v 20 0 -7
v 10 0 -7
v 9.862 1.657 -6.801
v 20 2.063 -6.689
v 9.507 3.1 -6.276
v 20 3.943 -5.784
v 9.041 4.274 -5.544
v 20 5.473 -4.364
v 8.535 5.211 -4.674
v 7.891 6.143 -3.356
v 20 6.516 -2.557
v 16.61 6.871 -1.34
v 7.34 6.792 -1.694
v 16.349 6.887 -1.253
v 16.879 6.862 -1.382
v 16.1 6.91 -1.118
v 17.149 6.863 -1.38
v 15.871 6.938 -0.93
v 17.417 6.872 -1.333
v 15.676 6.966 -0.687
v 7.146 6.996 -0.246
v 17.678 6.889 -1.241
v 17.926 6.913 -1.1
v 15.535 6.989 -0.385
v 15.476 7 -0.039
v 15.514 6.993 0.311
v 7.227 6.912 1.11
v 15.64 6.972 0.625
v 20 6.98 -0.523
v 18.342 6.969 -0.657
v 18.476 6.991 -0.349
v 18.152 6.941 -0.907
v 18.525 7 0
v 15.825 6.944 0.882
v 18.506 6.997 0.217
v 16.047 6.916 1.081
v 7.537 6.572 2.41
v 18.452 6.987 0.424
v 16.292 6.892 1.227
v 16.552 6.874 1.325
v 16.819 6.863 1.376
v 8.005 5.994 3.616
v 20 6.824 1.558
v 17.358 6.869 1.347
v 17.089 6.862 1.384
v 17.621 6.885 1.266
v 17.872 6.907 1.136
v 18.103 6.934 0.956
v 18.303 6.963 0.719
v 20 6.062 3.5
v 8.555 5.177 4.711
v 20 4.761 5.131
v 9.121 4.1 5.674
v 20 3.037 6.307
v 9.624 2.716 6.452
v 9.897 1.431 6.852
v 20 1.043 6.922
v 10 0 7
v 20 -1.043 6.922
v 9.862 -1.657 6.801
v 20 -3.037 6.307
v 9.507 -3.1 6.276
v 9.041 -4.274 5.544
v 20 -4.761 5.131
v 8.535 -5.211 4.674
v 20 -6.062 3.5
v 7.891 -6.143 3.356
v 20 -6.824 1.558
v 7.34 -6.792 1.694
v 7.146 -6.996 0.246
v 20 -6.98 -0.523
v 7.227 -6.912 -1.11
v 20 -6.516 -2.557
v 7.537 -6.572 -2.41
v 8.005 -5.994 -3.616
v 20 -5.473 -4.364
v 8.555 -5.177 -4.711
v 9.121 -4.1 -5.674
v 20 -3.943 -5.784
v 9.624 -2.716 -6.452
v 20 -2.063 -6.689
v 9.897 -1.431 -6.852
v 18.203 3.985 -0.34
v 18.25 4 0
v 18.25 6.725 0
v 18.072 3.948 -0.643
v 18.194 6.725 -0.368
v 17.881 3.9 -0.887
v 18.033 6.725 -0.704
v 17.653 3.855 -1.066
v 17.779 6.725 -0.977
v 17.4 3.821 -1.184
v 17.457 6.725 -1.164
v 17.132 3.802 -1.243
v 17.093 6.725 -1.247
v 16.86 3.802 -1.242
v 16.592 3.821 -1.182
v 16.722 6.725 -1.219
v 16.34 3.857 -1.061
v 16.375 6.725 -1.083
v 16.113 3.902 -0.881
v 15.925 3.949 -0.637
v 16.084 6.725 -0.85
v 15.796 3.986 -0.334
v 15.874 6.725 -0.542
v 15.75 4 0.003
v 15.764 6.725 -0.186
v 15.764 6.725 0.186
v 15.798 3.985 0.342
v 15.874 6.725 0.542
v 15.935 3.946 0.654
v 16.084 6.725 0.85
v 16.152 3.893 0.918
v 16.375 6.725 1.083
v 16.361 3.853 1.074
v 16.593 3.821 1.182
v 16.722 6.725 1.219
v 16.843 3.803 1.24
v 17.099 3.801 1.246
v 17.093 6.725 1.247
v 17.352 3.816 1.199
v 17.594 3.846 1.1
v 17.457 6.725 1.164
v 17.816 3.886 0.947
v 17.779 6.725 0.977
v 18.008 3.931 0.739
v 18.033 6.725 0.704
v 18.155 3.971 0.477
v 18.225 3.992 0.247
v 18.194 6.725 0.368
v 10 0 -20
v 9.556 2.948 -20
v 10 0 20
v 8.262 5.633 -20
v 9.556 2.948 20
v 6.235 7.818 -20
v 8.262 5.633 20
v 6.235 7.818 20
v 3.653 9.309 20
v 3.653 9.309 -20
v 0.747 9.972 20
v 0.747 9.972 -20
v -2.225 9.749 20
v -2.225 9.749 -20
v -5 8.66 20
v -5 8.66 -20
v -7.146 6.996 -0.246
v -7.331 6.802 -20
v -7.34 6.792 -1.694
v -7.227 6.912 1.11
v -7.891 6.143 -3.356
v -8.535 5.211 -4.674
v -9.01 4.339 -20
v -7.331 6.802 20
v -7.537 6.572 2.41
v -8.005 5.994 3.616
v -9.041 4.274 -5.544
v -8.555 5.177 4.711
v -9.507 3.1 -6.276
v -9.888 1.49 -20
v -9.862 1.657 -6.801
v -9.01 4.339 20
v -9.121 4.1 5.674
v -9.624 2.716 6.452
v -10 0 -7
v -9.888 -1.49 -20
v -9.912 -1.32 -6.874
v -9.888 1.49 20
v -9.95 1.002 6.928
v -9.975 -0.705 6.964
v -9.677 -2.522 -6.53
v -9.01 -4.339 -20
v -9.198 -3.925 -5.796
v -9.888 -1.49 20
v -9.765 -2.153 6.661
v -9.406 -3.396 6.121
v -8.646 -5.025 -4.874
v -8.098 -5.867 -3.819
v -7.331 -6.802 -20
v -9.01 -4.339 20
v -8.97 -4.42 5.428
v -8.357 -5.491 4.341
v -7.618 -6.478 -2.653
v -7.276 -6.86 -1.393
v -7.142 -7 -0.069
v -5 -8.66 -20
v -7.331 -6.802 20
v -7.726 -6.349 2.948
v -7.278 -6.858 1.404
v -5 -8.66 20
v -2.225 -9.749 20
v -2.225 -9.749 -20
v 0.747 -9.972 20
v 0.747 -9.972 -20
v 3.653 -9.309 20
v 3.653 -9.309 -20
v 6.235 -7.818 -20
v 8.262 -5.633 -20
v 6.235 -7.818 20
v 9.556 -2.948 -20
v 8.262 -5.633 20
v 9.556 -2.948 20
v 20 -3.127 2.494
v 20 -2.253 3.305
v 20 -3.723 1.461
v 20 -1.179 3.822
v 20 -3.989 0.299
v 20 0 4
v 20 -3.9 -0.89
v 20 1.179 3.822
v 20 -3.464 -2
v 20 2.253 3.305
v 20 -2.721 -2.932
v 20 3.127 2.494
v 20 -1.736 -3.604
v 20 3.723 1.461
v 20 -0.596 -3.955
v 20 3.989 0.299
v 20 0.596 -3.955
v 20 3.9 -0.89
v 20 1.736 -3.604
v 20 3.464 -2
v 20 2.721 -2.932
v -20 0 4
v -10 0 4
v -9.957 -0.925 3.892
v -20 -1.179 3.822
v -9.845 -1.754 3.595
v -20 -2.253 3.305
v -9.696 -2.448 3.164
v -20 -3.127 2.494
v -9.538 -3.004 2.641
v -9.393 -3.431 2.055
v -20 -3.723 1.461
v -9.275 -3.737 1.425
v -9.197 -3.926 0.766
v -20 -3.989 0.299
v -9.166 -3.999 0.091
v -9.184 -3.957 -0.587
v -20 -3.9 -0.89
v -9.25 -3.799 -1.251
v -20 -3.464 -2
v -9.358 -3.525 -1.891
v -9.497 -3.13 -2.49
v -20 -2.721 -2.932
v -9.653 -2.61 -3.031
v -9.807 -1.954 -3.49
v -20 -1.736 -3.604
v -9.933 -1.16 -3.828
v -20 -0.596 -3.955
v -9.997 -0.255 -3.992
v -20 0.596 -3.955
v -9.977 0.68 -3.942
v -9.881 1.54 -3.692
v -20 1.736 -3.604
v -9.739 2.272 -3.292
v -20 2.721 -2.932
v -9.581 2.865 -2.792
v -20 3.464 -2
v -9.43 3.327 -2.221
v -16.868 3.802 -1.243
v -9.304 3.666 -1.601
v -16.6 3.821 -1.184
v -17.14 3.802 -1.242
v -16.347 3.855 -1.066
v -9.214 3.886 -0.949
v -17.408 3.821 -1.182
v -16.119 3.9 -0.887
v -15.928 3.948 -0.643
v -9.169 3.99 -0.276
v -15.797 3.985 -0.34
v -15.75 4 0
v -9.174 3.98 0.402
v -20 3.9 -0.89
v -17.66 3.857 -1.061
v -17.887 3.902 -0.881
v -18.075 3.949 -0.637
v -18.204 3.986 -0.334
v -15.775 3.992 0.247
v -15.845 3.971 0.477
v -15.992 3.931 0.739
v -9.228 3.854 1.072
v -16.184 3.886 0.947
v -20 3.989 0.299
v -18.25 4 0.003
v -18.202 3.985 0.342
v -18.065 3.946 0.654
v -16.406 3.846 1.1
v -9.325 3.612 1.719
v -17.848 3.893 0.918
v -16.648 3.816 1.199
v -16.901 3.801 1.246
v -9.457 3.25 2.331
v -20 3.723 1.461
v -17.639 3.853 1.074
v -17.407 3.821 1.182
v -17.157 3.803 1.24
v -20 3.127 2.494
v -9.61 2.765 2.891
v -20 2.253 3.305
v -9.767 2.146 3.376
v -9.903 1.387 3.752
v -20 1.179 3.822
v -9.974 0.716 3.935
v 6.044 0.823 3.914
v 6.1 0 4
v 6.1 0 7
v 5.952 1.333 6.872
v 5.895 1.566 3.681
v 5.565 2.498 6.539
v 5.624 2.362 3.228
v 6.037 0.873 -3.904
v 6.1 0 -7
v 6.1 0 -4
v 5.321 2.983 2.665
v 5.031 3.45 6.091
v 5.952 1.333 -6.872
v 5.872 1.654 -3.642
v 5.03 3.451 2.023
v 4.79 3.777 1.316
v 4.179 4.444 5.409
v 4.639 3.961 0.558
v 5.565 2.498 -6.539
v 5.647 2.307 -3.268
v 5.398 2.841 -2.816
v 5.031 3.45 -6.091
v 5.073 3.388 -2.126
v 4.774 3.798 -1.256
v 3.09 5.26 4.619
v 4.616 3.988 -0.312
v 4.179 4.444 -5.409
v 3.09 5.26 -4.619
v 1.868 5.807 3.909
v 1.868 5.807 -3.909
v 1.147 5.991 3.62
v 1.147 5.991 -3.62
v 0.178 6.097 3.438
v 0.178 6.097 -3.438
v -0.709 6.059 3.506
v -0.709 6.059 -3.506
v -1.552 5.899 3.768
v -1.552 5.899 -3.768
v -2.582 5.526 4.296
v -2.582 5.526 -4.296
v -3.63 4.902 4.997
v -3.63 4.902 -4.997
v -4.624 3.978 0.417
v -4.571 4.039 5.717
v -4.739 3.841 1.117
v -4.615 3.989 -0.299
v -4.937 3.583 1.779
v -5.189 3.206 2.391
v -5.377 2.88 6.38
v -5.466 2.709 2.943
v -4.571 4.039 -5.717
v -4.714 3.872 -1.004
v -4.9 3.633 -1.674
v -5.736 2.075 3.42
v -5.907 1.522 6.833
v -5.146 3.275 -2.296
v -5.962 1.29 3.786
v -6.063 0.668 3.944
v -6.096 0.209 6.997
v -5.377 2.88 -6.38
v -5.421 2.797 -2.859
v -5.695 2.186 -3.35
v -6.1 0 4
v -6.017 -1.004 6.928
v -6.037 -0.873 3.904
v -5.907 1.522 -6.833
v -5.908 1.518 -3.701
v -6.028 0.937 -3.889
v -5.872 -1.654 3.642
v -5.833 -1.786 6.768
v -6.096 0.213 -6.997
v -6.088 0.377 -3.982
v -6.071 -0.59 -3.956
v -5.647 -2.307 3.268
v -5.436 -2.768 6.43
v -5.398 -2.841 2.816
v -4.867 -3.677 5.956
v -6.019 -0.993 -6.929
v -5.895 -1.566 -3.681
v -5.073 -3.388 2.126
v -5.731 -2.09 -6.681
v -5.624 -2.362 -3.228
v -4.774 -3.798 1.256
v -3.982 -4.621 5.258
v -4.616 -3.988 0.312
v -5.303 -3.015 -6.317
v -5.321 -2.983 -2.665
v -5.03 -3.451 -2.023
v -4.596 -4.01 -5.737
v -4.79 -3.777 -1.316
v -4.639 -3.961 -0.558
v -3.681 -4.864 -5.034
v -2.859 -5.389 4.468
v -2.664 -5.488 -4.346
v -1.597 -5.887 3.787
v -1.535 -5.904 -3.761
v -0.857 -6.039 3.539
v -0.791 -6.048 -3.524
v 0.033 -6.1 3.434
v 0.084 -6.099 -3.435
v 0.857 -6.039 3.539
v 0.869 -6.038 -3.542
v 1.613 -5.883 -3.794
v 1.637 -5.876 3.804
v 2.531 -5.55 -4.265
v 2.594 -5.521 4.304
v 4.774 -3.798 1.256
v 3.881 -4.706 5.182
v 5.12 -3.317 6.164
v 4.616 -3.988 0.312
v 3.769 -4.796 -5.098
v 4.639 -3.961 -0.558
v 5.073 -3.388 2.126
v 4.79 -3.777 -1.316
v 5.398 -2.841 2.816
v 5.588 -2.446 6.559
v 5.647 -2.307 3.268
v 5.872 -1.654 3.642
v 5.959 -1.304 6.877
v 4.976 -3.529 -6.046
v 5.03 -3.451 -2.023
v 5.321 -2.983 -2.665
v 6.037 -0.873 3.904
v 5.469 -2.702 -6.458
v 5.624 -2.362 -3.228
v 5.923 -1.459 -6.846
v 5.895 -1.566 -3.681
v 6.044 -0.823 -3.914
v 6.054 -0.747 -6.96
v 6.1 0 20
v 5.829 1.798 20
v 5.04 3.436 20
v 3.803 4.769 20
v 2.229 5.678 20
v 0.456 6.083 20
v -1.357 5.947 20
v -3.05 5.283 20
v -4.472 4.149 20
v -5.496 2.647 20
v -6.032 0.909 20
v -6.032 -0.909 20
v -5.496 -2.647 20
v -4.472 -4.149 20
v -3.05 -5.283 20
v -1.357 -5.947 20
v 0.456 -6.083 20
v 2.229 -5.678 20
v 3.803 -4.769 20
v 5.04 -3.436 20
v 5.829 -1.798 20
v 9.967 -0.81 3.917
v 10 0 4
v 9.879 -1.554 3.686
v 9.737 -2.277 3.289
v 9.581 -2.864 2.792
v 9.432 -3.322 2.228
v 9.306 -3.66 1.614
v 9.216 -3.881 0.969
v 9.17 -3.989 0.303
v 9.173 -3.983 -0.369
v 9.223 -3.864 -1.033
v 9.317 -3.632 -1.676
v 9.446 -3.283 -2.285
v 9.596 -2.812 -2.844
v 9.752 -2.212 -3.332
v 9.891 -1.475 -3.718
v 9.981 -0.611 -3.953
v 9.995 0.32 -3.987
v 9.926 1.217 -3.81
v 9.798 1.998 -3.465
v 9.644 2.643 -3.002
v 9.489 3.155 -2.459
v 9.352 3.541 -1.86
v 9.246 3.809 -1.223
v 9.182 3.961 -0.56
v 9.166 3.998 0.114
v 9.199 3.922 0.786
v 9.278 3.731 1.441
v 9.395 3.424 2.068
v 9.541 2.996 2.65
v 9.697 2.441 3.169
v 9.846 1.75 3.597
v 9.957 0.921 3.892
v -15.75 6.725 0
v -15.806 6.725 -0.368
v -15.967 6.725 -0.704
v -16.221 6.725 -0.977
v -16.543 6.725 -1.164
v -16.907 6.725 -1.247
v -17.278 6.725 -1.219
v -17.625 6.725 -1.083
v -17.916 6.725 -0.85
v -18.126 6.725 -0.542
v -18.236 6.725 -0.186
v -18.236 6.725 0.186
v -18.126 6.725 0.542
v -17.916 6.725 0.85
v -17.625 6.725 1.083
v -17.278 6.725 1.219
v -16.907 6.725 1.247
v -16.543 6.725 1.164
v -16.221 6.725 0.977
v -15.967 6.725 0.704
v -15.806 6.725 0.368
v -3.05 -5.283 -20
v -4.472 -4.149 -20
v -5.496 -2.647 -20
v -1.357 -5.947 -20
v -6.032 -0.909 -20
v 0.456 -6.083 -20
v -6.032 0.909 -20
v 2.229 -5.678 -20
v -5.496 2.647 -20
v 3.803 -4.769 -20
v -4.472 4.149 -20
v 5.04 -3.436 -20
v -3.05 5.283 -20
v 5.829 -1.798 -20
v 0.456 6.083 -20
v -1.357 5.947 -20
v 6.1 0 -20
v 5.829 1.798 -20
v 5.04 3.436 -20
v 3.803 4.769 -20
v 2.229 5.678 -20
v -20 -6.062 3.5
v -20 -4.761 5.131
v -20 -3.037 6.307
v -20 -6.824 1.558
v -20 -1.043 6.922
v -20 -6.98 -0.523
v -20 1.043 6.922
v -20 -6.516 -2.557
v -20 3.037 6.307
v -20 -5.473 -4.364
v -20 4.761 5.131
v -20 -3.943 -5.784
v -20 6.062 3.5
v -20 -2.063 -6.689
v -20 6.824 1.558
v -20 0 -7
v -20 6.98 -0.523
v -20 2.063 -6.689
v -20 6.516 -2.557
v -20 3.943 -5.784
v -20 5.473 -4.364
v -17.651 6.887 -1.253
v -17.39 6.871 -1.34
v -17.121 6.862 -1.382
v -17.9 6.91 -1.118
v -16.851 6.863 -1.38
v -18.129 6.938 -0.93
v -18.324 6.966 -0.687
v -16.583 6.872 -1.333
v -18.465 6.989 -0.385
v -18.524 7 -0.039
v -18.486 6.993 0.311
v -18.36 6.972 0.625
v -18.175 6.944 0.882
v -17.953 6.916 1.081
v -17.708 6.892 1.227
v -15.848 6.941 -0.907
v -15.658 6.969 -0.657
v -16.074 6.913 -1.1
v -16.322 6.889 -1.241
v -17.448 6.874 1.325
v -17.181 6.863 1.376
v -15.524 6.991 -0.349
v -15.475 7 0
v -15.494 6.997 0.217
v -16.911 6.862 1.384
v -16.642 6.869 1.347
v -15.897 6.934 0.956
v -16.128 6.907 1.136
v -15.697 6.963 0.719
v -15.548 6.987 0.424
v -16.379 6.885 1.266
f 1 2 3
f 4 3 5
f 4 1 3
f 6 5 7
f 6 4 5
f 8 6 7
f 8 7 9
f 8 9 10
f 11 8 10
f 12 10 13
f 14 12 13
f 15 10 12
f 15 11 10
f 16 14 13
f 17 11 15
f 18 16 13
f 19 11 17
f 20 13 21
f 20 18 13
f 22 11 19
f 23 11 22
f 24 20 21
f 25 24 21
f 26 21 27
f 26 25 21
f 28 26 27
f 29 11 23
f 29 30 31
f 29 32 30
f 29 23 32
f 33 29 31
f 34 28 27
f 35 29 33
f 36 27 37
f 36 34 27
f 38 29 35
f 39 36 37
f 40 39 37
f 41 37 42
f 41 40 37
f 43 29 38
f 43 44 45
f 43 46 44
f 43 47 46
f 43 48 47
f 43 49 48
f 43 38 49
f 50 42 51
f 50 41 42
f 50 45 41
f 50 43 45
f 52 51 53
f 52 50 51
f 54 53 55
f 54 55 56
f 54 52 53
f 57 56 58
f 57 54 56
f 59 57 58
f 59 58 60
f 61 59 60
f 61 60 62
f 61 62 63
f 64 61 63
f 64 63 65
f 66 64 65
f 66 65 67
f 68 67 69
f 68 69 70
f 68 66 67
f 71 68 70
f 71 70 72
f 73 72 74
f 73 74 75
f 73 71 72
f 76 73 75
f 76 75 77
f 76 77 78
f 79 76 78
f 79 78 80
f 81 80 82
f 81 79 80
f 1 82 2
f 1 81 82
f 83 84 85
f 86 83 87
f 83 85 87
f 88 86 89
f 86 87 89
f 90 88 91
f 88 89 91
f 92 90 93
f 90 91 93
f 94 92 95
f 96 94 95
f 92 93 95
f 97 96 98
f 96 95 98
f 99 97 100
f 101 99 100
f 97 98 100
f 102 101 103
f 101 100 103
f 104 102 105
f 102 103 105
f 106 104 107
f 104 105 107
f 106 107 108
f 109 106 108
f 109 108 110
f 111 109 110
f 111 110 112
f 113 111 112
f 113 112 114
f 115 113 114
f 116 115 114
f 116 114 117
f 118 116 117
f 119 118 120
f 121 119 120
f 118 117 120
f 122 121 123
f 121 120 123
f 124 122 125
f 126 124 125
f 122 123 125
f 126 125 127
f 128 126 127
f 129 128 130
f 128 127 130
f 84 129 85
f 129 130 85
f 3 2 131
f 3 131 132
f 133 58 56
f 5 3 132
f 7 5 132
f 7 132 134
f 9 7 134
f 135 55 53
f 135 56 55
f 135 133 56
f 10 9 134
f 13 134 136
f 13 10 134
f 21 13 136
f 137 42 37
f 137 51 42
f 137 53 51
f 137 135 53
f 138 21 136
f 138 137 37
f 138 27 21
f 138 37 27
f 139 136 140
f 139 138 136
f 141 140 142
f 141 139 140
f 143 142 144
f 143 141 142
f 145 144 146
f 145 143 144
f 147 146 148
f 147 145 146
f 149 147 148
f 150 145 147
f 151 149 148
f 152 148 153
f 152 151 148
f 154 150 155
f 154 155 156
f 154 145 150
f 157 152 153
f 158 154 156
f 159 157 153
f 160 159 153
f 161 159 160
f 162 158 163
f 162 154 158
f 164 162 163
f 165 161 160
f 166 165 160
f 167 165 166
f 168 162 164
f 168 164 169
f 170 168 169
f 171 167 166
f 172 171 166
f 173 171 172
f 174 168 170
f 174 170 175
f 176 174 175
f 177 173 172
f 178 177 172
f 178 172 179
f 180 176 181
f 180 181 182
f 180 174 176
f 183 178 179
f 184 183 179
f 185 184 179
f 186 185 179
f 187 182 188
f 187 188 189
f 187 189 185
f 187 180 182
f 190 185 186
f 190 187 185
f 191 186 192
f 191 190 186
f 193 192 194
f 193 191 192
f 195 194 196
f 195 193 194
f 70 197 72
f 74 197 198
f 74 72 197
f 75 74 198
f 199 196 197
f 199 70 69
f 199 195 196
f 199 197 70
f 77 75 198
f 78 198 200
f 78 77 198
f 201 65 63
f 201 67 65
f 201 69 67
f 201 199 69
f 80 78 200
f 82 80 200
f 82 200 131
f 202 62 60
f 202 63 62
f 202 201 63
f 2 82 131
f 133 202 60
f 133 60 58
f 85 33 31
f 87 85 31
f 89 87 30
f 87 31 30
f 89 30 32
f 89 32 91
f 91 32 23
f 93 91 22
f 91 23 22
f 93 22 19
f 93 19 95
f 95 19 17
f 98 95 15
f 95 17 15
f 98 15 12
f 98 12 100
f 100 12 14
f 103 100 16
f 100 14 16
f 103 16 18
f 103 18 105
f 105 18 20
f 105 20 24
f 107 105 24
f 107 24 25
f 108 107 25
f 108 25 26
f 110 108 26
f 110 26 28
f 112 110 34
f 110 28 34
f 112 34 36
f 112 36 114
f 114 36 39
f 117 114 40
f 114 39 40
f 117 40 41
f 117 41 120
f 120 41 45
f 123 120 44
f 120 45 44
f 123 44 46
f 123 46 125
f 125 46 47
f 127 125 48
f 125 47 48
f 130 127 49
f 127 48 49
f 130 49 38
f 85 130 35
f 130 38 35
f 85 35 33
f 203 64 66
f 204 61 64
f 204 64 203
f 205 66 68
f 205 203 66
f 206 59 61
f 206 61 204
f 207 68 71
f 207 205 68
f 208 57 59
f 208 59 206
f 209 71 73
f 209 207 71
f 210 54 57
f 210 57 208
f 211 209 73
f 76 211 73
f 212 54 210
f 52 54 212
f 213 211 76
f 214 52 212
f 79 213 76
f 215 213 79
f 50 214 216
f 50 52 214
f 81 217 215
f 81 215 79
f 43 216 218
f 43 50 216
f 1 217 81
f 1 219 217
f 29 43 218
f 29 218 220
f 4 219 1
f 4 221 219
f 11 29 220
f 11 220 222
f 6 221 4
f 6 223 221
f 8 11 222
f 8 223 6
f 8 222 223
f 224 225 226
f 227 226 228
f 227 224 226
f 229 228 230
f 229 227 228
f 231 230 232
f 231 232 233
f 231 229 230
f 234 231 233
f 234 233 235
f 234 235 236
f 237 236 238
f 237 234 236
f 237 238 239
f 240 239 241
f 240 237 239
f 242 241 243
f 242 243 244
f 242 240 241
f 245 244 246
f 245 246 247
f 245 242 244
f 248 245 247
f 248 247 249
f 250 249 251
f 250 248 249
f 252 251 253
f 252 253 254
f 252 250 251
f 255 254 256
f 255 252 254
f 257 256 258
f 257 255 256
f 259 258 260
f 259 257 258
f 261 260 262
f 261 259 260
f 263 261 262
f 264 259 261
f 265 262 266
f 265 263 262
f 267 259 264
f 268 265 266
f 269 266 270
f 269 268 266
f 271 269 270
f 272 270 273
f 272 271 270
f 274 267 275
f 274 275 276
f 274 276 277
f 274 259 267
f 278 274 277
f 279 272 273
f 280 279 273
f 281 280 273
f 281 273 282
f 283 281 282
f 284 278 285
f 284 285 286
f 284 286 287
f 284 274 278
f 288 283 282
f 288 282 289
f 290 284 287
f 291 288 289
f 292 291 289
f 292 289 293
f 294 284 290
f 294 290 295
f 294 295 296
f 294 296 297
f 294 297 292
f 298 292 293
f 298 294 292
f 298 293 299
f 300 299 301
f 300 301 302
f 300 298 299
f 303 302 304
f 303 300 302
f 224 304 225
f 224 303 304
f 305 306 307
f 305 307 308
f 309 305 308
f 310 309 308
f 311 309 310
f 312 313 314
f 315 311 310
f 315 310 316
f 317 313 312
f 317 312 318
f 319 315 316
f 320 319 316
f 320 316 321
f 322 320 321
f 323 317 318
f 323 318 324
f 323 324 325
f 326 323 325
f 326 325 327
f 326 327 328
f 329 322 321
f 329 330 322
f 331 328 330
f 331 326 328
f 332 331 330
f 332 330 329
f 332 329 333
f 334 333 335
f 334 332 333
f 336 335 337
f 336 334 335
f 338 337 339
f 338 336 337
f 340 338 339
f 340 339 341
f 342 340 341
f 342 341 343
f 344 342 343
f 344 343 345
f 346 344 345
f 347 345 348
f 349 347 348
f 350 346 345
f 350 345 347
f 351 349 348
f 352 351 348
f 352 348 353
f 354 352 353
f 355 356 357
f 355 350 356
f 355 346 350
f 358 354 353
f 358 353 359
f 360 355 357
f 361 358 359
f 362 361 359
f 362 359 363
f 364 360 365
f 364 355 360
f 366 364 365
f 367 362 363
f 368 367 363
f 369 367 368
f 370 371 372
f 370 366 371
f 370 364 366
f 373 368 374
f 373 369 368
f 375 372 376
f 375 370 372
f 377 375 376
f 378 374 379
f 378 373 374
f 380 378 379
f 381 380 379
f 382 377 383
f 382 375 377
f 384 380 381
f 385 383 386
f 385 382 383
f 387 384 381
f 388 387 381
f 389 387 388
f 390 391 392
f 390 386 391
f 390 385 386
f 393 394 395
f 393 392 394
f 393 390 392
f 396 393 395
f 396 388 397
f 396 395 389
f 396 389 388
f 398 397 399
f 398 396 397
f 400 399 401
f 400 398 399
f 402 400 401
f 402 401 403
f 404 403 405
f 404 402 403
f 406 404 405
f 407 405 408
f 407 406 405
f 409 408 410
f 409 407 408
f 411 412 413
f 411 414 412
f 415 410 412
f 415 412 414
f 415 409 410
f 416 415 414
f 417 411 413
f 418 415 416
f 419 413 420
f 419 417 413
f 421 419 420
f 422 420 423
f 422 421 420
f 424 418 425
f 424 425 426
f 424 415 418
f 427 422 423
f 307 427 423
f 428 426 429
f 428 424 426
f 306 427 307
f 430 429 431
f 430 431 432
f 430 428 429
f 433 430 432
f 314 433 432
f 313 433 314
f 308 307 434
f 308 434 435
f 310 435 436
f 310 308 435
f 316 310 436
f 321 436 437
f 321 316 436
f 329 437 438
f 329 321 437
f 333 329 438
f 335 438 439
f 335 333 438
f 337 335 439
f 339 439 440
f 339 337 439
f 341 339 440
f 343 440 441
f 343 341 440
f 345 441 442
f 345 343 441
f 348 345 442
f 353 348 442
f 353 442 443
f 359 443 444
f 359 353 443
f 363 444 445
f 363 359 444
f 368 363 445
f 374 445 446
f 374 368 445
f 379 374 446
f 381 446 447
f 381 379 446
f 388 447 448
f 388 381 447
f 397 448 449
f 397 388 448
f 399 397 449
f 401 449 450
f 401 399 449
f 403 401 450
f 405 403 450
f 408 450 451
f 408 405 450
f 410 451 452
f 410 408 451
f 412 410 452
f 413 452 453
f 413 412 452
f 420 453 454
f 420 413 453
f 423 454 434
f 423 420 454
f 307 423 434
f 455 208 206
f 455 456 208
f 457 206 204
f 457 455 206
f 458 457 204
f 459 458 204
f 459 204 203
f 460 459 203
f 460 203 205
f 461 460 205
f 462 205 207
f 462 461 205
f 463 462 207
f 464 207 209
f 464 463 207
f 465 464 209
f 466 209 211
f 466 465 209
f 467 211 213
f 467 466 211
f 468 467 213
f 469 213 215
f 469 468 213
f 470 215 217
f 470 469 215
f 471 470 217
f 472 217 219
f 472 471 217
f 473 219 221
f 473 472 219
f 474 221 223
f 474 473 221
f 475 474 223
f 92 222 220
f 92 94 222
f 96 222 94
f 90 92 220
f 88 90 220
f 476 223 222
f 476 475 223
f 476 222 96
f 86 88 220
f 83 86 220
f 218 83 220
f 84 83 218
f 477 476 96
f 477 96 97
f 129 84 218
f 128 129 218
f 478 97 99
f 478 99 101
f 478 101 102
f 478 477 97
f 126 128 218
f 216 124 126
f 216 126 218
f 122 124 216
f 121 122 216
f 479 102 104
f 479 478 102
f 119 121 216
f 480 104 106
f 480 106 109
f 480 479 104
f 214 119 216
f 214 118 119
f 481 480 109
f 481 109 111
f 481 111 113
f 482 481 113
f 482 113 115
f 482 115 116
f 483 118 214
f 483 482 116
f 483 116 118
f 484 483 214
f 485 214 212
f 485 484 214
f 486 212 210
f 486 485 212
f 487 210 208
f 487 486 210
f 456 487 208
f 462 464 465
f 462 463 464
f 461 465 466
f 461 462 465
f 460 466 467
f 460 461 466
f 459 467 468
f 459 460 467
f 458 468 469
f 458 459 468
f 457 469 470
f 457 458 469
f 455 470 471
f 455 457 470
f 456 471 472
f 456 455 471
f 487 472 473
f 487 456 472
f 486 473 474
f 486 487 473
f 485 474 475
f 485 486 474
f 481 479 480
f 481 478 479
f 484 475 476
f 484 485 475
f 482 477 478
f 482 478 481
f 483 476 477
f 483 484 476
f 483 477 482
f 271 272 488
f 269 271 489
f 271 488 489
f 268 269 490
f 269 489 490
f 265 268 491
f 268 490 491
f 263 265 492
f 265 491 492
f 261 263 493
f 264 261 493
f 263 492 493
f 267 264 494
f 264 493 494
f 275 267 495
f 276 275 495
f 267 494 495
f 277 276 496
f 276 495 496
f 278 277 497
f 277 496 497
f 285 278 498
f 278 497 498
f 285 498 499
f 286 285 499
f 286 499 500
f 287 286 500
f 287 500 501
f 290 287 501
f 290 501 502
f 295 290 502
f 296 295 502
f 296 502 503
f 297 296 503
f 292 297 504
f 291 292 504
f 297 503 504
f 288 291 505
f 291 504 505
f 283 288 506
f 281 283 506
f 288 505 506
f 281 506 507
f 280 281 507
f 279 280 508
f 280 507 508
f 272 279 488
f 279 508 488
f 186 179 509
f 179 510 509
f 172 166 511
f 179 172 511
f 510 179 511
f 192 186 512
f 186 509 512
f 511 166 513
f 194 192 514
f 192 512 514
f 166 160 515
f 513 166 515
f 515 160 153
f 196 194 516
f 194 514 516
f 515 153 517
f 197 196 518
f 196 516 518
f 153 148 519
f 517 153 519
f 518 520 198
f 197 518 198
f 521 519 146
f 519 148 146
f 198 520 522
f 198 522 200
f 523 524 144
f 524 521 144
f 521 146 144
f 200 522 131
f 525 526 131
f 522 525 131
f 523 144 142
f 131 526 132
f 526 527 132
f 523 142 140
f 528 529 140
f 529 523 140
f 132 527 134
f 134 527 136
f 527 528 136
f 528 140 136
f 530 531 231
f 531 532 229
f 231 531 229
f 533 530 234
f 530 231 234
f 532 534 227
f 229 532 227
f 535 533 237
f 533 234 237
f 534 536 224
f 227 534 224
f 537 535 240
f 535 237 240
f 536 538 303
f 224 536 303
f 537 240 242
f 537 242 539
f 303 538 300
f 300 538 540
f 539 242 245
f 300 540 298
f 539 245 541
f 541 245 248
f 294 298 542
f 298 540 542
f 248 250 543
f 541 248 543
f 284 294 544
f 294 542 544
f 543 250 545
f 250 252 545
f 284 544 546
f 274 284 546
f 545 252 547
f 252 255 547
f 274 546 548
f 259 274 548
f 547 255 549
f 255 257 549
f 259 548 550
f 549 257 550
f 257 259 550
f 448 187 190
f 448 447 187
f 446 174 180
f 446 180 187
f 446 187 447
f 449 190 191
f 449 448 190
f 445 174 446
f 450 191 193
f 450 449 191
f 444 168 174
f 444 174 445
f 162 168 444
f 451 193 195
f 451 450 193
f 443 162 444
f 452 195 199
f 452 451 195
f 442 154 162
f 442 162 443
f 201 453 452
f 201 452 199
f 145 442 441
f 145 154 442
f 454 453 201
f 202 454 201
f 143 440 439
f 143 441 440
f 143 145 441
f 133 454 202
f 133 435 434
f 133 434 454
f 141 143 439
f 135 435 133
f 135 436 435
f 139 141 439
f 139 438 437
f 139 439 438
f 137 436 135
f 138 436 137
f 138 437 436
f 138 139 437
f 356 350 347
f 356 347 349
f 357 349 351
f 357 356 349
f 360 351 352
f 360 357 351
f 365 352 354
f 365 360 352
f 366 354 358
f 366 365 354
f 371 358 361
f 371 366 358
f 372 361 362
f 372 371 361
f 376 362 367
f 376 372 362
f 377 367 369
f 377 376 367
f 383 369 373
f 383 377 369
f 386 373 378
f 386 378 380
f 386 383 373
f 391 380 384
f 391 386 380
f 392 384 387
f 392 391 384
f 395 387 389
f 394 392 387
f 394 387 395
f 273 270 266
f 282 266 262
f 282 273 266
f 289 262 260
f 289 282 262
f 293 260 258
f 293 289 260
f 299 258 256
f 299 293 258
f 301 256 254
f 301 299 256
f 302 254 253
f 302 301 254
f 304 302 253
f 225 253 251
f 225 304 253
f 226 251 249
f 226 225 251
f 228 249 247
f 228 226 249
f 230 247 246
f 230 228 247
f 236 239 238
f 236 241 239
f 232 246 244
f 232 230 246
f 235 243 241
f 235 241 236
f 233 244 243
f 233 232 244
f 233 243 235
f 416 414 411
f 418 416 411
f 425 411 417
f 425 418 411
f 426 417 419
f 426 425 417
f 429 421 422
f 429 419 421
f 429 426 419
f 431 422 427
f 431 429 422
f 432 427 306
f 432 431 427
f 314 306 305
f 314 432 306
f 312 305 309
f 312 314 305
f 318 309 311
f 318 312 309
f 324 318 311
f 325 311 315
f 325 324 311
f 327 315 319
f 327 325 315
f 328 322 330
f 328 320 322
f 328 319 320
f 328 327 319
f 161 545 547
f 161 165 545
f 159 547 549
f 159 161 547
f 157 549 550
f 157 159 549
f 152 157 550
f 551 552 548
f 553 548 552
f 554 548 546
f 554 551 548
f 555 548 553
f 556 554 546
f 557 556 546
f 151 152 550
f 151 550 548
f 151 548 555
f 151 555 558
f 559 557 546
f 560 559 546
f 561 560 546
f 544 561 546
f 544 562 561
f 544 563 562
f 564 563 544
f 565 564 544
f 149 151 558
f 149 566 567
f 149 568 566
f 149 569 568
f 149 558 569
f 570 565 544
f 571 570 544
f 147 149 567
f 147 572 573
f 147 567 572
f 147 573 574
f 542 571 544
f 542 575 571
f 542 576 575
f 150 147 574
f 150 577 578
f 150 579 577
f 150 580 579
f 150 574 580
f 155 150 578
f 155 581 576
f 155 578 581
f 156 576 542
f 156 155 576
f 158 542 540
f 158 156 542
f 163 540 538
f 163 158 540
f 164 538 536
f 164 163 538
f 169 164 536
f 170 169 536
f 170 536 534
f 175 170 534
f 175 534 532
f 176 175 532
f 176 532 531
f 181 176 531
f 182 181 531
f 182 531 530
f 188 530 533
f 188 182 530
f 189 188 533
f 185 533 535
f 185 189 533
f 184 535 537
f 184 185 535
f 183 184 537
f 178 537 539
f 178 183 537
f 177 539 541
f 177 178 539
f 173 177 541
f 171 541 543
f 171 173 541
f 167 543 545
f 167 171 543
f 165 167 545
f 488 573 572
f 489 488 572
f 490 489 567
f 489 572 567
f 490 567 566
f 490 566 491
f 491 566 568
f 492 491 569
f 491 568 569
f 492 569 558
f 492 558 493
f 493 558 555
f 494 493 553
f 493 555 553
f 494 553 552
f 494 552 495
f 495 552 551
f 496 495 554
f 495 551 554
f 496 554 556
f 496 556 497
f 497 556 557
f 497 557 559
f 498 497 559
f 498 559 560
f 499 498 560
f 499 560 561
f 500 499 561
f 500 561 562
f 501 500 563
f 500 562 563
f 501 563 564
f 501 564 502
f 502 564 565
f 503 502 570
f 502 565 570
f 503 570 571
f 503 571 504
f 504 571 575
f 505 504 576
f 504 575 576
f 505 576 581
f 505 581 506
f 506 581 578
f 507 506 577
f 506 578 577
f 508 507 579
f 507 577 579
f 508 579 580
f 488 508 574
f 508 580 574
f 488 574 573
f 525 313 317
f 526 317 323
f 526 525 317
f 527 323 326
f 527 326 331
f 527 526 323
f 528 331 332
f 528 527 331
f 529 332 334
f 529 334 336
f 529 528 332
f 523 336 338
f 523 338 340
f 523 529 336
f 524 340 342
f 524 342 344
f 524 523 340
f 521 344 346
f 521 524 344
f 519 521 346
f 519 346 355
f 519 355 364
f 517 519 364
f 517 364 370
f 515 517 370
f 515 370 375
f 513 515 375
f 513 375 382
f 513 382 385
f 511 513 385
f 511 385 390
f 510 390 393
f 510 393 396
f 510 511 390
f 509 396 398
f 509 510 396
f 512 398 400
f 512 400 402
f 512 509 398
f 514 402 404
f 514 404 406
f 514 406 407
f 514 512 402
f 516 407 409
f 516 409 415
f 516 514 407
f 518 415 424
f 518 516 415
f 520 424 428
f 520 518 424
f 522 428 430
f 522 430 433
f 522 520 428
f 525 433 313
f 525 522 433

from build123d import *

# Parameters (mm, degrees)
SKETCH1_R               = 10
SKETCH1_R_2             = 6.1
BOSS_EXTRUDE1_DEPTH     = 20
SKETCH2_R               = 7
SKETCH2_R_2             = 4
BOSS_EXTRUDE2_DEPTH     = 20
CUT_EXTRUDE1_DEPTH      = 31.000000167
CUT_EXTRUDE1_DEPTH_BACK = 31.000000167
SKETCH5_R               = 6.1


# Read off the part's stored shape, not the designer's step: M3 Tapped Hole1
with BuildPart() as part:
    # Sketch1 → Boss-Extrude1 (new, symmetric)
    with BuildSketch(Plane.XY):
        Circle(SKETCH1_R)
        Circle(SKETCH1_R_2, mode=Mode.SUBTRACT)
    extrude(amount=BOSS_EXTRUDE1_DEPTH, both=True)

    # Sketch2 → Boss-Extrude2 (add, symmetric)
    with BuildSketch(Plane(origin=(0, 0, 0), x_dir=(0, 0, -1), z_dir=(1, 0, 0))):
        Circle(SKETCH2_R)
        with Locations(Location((0, 0, 0), (0, 0, 180))):
            Circle(SKETCH2_R_2, mode=Mode.SUBTRACT)
    extrude(amount=BOSS_EXTRUDE2_DEPTH, both=True)

    # M3 Tapped Hole1 outline → M3 Tapped Hole1 (revolve, cut)
    with BuildSketch(Plane(origin=(17, 0, 0), x_dir=(1, 0, 0), z_dir=(0, 0, 1))):
        Polygon((1.525056823, 7.000056823), (0, 7.000056823), (0, 3.799585789), (1.25, 3.799585789), (1.25, 6.725), align=None)
    revolve(axis=Axis((17, 0, 0), (0, 1, 0)), mode=Mode.SUBTRACT)

    # M3 Tapped Hole1 2 outline → M3 Tapped Hole1 2 (revolve, cut)
    with BuildSketch(Plane(origin=(-17, 0, 0), x_dir=(1, 0, 0), z_dir=(0, 0, 1))):
        Polygon((1.525056823, 7.000056823), (0, 7.000056823), (0, 3.799585789), (1.25, 3.799585789), (1.25, 6.725), align=None)
    revolve(axis=Axis((-17, 0, 0), (0, 1, 0)), mode=Mode.SUBTRACT)

    # Sketch5 → Cut-Extrude1 (cut, two sides: drawn at the far end of the back side and taken through both)
    with BuildSketch(Plane.XY.offset(-CUT_EXTRUDE1_DEPTH_BACK)):
        Circle(SKETCH5_R)
    extrude(amount=CUT_EXTRUDE1_DEPTH + CUT_EXTRUDE1_DEPTH_BACK, mode=Mode.SUBTRACT)


solid = part.part
